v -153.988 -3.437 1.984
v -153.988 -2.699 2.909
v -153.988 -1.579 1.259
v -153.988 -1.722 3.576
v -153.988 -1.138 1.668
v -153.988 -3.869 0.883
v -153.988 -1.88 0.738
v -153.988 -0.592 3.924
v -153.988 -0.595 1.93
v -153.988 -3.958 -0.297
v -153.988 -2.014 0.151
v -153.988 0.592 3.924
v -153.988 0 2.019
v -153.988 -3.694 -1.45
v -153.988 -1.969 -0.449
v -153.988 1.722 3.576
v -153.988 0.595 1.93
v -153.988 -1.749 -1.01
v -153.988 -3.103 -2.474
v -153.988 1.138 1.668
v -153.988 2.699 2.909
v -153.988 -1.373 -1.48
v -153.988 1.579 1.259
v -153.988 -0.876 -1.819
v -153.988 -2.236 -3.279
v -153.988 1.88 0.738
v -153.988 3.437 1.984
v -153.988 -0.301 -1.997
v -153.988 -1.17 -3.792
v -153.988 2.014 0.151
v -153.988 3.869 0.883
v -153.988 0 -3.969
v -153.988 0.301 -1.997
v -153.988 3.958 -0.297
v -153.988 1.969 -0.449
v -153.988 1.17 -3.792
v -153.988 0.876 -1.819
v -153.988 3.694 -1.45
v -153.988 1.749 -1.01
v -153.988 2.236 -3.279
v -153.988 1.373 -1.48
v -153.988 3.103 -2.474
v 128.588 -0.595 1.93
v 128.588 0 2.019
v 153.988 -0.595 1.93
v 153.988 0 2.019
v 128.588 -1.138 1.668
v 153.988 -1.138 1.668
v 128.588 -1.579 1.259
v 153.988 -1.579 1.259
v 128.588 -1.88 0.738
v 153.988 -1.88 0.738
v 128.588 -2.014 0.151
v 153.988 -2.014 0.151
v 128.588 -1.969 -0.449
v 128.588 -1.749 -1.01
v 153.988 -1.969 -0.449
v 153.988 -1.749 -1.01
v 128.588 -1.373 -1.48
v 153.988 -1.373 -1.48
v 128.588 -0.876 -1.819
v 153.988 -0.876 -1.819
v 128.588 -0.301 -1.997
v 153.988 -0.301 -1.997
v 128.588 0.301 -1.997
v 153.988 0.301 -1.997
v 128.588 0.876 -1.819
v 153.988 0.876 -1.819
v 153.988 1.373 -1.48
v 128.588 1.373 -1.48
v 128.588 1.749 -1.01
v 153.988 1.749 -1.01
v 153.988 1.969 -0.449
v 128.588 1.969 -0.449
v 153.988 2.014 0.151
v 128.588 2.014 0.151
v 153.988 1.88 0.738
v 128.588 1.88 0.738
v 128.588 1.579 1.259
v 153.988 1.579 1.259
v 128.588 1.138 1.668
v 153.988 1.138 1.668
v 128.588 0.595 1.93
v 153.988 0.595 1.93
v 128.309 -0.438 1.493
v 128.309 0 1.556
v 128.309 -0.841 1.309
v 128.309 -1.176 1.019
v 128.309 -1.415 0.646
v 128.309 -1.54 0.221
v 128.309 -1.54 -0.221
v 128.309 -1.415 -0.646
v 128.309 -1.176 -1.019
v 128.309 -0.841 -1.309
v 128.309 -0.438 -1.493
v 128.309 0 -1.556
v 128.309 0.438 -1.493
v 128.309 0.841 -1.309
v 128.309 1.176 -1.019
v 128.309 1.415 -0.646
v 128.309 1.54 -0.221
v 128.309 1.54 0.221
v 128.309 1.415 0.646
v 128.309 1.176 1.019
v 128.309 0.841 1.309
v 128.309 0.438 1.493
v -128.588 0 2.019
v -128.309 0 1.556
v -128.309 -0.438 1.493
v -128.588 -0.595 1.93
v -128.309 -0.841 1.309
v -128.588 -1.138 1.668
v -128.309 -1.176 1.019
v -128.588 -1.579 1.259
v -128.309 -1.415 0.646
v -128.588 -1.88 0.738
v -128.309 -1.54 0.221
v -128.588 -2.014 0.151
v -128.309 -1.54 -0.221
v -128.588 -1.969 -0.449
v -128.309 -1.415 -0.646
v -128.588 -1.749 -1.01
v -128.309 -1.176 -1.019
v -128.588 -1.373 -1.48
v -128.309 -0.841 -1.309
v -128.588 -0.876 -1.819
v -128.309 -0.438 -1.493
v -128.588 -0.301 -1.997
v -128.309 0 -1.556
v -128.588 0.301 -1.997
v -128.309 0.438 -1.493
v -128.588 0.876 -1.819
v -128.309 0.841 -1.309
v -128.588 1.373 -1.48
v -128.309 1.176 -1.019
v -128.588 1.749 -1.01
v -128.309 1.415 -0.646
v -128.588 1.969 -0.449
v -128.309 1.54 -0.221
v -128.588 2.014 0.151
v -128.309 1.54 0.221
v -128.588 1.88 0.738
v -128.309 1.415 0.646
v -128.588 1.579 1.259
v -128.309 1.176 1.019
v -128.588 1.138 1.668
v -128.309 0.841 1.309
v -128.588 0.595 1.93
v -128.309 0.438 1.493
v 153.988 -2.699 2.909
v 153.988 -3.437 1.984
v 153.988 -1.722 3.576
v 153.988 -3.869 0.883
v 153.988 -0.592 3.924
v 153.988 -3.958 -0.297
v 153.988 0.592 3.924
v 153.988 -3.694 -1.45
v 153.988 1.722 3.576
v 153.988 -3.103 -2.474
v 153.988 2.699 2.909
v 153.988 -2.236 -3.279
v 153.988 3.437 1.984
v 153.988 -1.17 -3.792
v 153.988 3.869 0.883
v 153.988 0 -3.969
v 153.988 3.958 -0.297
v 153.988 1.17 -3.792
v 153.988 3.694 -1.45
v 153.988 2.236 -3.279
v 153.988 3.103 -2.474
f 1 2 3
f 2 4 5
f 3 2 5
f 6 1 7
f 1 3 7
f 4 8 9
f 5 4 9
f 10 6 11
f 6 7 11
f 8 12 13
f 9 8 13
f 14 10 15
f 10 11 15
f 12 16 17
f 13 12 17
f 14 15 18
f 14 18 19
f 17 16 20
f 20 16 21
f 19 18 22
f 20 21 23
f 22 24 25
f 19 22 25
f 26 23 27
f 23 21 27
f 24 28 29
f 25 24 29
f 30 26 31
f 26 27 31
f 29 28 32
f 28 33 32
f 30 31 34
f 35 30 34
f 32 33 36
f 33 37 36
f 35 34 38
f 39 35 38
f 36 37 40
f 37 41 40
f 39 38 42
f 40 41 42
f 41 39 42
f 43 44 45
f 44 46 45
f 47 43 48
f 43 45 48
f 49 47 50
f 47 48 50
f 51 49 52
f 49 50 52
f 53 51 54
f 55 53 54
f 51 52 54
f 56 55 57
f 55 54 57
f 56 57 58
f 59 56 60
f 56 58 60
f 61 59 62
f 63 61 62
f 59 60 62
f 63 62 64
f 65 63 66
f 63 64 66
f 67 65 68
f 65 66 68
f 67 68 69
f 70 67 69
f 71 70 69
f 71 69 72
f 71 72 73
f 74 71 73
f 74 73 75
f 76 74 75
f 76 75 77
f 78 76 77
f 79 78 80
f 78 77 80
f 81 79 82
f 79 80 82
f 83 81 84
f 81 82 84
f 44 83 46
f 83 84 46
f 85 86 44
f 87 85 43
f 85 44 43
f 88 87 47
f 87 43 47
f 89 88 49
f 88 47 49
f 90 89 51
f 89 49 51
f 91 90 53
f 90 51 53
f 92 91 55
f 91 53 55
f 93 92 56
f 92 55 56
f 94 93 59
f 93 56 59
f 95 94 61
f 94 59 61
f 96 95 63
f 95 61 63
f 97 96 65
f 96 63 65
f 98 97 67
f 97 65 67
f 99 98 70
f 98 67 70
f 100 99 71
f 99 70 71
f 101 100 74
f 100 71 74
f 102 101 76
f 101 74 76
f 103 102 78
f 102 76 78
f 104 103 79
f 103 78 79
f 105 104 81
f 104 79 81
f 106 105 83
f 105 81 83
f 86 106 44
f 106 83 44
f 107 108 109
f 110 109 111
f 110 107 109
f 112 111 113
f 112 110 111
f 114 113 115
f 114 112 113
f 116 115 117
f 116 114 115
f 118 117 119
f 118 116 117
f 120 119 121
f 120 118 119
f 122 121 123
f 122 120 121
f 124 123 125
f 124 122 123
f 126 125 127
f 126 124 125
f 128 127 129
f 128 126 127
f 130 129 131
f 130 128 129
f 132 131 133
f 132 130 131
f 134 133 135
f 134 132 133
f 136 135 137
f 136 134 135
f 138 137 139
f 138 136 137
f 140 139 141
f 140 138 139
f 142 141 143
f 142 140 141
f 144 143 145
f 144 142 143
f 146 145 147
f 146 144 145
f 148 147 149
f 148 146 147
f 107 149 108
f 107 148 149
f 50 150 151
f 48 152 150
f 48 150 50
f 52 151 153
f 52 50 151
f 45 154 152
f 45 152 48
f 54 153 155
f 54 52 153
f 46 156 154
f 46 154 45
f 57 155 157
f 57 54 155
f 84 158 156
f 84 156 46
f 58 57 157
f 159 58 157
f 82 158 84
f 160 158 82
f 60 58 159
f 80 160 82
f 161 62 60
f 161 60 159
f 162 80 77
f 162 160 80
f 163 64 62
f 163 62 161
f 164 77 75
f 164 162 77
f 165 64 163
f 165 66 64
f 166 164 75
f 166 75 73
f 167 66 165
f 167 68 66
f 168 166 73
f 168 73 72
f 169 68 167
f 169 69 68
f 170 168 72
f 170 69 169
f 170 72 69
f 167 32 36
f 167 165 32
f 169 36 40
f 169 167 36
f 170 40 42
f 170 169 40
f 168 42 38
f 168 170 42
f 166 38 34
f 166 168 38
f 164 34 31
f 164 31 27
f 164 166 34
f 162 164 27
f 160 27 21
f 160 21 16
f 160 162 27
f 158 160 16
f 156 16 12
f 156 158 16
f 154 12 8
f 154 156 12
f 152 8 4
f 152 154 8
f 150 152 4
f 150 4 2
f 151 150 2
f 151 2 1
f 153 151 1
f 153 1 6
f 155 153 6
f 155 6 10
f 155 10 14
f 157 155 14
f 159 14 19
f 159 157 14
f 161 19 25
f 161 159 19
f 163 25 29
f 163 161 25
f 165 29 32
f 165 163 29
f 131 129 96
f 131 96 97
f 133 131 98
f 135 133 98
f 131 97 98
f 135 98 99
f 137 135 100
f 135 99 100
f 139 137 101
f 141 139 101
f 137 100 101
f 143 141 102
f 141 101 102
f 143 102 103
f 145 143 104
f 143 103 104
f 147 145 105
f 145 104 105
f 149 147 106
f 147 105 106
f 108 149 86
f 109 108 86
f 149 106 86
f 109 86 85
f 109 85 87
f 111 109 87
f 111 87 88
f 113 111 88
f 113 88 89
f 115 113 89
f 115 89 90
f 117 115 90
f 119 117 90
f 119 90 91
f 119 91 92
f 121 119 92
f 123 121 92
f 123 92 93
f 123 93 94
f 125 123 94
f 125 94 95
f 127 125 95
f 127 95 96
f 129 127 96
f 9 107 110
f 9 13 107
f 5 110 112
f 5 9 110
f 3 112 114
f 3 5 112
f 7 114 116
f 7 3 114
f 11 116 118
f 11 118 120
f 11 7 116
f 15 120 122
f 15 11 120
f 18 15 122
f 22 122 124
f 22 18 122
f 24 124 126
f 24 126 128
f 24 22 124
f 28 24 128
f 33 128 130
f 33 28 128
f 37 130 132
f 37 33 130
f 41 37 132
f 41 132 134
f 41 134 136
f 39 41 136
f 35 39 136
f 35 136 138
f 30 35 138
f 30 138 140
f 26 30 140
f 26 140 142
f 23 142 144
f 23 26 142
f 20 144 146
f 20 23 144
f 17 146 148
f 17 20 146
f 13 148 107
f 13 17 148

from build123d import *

# Parameters (mm, degrees)
SKETCH1_R           = 3.96875
BOSS_EXTRUDE1_DEPTH = 153.9875
SKETCH2_R           = 1.55575
CUT_EXTRUDE1_DEPTH  = 309.02613944


with BuildPart() as part:
    # Sketch1 → Boss-Extrude1 (new, symmetric)
    with BuildSketch(Plane(origin=(0, 0, 0), x_dir=(0, 0, -1), z_dir=(1, 0, 0))):
        Circle(SKETCH1_R)
    extrude(amount=BOSS_EXTRUDE1_DEPTH, both=True)

    # Sketch6 → #10-32 Tapped Hole1 (revolve, cut)
    with BuildSketch(Plane(origin=(-153.9875, 0, 0), x_dir=(0, 0, 1), z_dir=(0, 1, 0))):
        Polygon((0, 0), (0, 26.613317848), (2.0193, 25.4), (2.0193, 0), align=None)
    f_10_32_tapped_hole1 = revolve(axis=Axis((-160.3375, 0, 0), (1, 0, 0)), mode=Mode.SUBTRACT)

    # Sketch2 → Cut-Extrude1 (cut, through all)
    with BuildSketch(Plane(origin=(153.9875, 0, 0), x_dir=(0, 0, -1), z_dir=(1, 0, 0))):
        Circle(SKETCH2_R)
    extrude(amount=-CUT_EXTRUDE1_DEPTH, mode=Mode.SUBTRACT)

    # Mirror1: #10-32 Tapped Hole1 across plane
    add(f_10_32_tapped_hole1.mirror(Plane(origin=(0, 0, 0), x_dir=(0, 0, 1), z_dir=(1, 0, 0))), mode=Mode.SUBTRACT)


solid = part.part
